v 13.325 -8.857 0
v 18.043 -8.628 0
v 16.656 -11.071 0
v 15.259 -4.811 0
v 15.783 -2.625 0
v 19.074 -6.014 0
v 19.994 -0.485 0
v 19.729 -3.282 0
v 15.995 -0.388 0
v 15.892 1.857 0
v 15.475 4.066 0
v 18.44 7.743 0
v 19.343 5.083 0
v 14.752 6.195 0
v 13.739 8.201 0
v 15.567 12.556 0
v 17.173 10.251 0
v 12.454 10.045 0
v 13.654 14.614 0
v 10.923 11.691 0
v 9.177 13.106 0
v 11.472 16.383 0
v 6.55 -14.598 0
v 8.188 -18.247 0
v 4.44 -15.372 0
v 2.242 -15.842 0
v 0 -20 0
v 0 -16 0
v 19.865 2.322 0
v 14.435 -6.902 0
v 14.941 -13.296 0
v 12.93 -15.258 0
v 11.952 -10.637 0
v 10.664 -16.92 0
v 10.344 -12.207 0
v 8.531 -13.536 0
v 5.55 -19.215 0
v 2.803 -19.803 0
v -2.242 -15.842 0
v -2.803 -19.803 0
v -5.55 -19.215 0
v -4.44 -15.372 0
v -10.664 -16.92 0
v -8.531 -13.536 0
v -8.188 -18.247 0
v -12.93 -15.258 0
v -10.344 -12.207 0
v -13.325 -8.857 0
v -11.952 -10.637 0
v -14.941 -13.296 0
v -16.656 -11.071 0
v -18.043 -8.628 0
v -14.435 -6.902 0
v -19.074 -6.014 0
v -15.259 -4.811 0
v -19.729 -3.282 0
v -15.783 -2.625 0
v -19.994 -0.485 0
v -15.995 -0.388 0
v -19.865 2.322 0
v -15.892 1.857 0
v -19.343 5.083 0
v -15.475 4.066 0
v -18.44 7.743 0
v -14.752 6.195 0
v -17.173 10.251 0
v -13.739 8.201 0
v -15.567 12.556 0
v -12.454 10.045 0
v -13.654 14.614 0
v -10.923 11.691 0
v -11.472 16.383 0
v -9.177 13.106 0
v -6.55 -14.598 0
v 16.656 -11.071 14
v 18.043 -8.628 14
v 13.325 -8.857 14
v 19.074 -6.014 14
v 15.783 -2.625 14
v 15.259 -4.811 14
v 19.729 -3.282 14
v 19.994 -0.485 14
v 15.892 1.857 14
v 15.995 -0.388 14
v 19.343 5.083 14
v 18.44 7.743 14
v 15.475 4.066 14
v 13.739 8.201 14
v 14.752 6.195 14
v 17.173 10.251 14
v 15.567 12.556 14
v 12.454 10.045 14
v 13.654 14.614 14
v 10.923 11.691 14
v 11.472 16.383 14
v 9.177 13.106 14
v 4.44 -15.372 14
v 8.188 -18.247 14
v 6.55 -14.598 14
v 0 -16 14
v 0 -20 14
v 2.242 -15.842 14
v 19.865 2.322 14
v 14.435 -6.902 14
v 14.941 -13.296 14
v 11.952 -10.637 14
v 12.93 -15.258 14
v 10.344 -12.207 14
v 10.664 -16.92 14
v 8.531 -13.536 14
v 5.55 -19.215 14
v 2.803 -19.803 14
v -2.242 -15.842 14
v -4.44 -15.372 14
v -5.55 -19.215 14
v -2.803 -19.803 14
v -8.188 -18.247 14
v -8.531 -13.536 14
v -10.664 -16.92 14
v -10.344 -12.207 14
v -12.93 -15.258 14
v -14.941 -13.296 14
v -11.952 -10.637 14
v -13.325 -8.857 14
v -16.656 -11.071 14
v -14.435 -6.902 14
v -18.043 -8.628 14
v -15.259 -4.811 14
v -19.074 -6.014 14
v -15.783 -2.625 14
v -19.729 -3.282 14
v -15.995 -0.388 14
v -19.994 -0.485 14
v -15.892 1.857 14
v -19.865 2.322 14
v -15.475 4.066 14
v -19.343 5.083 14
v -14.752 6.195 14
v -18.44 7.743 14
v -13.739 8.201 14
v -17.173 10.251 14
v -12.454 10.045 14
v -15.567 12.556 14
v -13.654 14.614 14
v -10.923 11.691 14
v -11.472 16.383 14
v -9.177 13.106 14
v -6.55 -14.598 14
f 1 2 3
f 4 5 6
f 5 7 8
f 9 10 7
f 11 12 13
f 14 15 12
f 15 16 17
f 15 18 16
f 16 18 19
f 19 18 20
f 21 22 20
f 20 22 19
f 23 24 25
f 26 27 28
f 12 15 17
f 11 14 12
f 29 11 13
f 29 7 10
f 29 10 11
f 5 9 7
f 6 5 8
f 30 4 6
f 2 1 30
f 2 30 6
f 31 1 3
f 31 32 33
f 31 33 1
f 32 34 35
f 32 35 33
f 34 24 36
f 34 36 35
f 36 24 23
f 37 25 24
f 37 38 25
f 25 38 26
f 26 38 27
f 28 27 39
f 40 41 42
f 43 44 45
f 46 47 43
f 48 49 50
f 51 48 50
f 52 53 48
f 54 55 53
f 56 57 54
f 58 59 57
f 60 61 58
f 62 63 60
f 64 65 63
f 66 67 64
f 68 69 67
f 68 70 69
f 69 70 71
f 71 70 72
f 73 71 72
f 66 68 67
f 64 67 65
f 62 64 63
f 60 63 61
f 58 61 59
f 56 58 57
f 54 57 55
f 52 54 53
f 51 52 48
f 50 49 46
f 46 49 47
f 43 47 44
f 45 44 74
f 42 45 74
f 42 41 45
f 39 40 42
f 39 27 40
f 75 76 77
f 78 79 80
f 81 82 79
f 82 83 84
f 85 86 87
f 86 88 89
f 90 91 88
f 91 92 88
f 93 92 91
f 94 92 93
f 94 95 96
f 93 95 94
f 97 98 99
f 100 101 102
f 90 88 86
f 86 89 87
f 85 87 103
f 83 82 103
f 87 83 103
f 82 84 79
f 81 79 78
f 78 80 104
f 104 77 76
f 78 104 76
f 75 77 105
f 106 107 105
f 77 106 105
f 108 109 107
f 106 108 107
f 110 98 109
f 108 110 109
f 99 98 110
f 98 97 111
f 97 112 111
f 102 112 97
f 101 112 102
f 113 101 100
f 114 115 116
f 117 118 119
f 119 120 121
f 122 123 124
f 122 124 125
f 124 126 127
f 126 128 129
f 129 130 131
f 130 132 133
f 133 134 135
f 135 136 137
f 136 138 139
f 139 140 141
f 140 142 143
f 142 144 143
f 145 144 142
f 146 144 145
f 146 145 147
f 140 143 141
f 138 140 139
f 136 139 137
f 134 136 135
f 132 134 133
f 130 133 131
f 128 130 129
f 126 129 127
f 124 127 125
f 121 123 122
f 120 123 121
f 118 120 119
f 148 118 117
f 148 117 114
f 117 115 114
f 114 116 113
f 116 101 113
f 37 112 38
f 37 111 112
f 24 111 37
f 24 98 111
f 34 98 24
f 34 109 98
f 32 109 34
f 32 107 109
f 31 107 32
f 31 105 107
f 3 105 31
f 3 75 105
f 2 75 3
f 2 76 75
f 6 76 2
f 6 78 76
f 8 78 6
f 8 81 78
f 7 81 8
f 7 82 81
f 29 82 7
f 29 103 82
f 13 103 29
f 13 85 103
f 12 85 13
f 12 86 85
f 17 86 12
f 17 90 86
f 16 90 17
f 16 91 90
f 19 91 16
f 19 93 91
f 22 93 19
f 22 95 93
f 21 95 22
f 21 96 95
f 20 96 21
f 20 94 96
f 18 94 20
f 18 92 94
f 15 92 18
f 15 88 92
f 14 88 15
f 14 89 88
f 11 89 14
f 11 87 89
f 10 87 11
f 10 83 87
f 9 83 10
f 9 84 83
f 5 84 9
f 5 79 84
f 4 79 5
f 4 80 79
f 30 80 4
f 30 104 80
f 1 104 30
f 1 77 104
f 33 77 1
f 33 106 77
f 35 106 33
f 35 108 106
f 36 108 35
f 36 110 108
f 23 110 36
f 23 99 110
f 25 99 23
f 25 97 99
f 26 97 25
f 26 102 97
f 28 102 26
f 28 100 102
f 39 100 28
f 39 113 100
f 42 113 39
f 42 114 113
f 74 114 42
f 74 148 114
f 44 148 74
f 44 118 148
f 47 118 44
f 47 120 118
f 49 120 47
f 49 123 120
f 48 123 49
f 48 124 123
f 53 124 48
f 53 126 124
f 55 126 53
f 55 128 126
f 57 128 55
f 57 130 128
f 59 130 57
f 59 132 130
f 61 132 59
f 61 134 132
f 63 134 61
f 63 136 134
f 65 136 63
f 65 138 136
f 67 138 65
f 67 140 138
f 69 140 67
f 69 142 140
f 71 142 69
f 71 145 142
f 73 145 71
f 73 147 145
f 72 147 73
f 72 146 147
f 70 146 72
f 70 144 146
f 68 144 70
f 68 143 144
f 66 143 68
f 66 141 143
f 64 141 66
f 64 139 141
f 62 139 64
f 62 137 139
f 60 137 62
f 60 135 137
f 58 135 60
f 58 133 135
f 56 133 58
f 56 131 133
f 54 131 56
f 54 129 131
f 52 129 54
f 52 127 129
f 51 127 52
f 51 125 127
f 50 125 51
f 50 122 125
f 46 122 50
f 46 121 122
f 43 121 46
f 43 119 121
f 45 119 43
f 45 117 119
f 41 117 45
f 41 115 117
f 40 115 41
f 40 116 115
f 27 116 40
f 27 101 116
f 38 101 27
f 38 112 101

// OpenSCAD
$fn = 32;

// ----------------------------------------------------------------------
// Spring clip: 40 mm outside, 4 mm band, 70 degree opening
// ----------------------------------------------------------------------

// --- parameters (mm) ---
outer_r = 20;             // clip outside radius
inner_r = 16;             // clip bore radius
band = 4;                 // band thickness
clip_w = 14;              // clip width
opening = 70;             // opening angle

clip_profile = [[-11.472, 16.383], [-13.654, 14.614], [-15.567, 12.556], [-17.173, 10.251], [-18.44, 7.743], [-19.343, 5.083], [-19.865, 2.322], [-19.994, -0.485], [-19.729, -3.282], [-19.074, -6.014], [-18.043, -8.628], [-16.656, -11.071], [-14.941, -13.296], [-12.93, -15.258], [-10.664, -16.92], [-8.188, -18.247], [-5.55, -19.215], [-2.803, -19.803], [0, -20], [2.803, -19.803], [5.55, -19.215], [8.188, -18.247], [10.664, -16.92], [12.93, -15.258], [14.941, -13.296], [16.656, -11.071], [18.043, -8.628], [19.074, -6.014], [19.729, -3.282], [19.994, -0.485], [19.865, 2.322], [19.343, 5.083], [18.44, 7.743], [17.173, 10.251], [15.567, 12.556], [13.654, 14.614], [11.472, 16.383], [9.177, 13.106], [10.923, 11.691], [12.454, 10.045], [13.739, 8.201], [14.752, 6.195], [15.475, 4.066], [15.892, 1.857], [15.995, -0.388], [15.783, -2.625], [15.259, -4.811], [14.435, -6.902], [13.325, -8.857], [11.952, -10.637], [10.344, -12.207], [8.531, -13.536], [6.55, -14.598], [4.44, -15.372], [2.242, -15.842], [0, -16], [-2.242, -15.842], [-4.44, -15.372], [-6.55, -14.598], [-8.531, -13.536], [-10.344, -12.207], [-11.952, -10.637], [-13.325, -8.857], [-14.435, -6.902], [-15.259, -4.811], [-15.783, -2.625], [-15.995, -0.388], [-15.892, 1.857], [-15.475, 4.066], [-14.752, 6.195], [-13.739, 8.201], [-12.454, 10.045], [-10.923, 11.691], [-9.177, 13.106]];

difference() {
  union() {
    linear_extrude(height = clip_w) polygon(clip_profile);
  }
}
